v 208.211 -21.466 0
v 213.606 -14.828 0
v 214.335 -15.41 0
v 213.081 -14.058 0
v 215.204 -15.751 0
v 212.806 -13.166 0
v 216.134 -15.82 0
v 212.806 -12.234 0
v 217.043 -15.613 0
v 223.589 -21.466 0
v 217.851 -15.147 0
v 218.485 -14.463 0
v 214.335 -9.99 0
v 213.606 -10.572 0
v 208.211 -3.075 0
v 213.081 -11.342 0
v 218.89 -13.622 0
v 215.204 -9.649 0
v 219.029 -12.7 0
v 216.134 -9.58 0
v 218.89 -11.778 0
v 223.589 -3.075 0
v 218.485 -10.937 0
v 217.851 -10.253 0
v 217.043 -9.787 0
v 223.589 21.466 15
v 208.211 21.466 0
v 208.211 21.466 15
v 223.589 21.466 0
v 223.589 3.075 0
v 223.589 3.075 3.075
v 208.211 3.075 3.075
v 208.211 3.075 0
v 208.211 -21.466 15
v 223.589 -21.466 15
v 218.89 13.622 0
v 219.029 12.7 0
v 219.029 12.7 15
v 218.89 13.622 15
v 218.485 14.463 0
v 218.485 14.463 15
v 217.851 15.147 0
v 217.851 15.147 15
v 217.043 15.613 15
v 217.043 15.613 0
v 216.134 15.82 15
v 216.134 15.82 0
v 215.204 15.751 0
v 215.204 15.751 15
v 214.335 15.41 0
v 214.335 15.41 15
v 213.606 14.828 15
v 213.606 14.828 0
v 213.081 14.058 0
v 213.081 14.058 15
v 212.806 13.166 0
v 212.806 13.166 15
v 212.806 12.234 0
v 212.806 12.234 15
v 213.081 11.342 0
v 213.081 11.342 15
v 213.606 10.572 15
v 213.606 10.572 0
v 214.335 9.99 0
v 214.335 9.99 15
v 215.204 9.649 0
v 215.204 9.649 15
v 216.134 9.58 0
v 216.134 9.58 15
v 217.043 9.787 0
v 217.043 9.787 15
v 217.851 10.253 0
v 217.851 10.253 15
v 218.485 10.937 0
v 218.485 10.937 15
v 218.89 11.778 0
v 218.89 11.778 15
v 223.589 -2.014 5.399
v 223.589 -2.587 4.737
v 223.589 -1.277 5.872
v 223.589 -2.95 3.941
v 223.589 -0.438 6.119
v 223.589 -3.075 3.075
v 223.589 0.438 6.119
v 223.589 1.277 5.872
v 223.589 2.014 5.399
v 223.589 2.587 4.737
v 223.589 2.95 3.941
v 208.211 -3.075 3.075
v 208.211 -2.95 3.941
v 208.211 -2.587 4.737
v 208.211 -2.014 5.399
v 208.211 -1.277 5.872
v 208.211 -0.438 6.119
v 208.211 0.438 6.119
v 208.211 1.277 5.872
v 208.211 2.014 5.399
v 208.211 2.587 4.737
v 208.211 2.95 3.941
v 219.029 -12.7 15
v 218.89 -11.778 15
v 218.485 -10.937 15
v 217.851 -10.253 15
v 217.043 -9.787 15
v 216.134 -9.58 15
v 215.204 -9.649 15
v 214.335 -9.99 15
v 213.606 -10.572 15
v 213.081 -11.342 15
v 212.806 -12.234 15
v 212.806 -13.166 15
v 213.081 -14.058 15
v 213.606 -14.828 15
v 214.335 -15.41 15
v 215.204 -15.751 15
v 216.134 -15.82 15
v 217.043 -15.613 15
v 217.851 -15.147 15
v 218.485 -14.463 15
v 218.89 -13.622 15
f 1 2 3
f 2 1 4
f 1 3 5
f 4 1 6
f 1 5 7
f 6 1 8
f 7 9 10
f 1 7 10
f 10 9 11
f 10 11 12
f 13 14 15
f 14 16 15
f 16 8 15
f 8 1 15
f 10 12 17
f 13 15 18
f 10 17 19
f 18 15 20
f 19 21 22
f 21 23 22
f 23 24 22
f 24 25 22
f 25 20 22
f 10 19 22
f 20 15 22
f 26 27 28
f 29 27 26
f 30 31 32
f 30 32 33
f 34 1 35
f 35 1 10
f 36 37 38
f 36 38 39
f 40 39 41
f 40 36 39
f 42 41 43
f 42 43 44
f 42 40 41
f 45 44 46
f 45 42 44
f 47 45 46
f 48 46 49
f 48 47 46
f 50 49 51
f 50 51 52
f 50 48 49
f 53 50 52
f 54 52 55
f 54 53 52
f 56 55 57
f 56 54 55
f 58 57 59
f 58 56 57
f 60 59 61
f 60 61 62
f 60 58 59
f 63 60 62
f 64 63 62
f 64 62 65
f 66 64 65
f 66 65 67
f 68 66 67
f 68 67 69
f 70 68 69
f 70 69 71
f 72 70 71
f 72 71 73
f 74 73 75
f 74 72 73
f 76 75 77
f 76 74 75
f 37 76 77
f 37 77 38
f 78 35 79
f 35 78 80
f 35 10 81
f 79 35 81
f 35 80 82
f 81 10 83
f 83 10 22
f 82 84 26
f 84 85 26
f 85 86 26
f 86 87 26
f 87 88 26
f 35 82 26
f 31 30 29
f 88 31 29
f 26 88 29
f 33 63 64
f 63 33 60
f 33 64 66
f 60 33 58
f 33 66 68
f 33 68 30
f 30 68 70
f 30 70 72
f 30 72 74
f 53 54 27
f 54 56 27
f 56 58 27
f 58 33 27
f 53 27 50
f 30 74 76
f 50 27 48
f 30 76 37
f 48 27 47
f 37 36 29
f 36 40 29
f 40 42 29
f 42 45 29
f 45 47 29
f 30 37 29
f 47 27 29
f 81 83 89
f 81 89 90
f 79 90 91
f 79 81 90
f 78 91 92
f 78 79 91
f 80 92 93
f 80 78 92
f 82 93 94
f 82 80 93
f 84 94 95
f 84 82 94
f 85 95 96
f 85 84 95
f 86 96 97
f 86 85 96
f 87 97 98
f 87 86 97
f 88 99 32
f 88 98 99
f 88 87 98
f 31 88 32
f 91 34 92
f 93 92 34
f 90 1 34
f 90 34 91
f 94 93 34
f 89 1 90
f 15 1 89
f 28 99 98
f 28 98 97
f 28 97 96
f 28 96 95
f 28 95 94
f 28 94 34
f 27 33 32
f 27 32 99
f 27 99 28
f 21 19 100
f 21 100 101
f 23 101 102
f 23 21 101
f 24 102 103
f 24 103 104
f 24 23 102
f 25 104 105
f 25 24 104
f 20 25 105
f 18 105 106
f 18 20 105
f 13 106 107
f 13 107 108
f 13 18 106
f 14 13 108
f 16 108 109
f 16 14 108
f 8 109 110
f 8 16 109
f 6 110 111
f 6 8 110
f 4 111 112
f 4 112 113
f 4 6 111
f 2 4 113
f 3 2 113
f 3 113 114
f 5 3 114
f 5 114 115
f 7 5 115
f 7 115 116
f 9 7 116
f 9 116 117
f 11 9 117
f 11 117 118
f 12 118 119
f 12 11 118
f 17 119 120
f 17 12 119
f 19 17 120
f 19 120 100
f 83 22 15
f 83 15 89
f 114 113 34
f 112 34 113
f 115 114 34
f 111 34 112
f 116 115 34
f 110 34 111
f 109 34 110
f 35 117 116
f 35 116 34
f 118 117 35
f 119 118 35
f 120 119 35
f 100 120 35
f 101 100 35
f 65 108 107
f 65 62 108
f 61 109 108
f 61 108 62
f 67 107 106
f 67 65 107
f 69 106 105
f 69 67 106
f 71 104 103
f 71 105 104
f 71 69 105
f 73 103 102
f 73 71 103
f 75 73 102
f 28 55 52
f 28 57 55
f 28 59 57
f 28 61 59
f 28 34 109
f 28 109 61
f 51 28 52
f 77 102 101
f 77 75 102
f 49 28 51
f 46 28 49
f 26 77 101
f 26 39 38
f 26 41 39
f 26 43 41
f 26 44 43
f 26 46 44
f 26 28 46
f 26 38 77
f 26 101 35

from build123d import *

# Parameters (mm, degrees)
SKETCH1_W               = 15.377554838
SKETCH1_H               = 42.931213808
SKETCH1_R               = 3.129225598
BOSS_EXTRUDE1_DEPTH     = 15
CUT_EXTRUDE1_DEPTH      = 1
CUT_EXTRUDE1_DEPTH_BACK = 16.377554838


with BuildPart() as part:
    # Sketch1 → Boss-Extrude1 (new body)
    with BuildSketch(Plane.XY):
        with Locations((215.9, 0)):
            Rectangle(SKETCH1_W, SKETCH1_H)
        with Locations((215.9, -12.7)):
            Circle(SKETCH1_R, mode=Mode.SUBTRACT)
        with Locations((215.9, 12.7)):
            Circle(SKETCH1_R, mode=Mode.SUBTRACT)
    extrude(amount=BOSS_EXTRUDE1_DEPTH)

    # Sketch2 → Cut-Extrude1 (cut, two sides)
    with BuildSketch(Plane(origin=(223.588777419, 0, 0), x_dir=(0, 0, -1), z_dir=(1, 0, 0))) as cut_extrude1_sk:
        with BuildLine():
            Line((0, -3.075), (-3.075, -3.075))
            ThreePointArc((-3.075, -3.075), (-6.15, 0), (-3.075, 3.075))
            Line((-3.075, 3.075), (0, 3.075))
            ThreePointArc((0, 3.075), (3.075, 0), (0, -3.075))
        make_face()
    extrude(amount=CUT_EXTRUDE1_DEPTH, mode=Mode.SUBTRACT)
    extrude(cut_extrude1_sk.sketch, amount=-CUT_EXTRUDE1_DEPTH_BACK, mode=Mode.SUBTRACT)


solid = part.part
